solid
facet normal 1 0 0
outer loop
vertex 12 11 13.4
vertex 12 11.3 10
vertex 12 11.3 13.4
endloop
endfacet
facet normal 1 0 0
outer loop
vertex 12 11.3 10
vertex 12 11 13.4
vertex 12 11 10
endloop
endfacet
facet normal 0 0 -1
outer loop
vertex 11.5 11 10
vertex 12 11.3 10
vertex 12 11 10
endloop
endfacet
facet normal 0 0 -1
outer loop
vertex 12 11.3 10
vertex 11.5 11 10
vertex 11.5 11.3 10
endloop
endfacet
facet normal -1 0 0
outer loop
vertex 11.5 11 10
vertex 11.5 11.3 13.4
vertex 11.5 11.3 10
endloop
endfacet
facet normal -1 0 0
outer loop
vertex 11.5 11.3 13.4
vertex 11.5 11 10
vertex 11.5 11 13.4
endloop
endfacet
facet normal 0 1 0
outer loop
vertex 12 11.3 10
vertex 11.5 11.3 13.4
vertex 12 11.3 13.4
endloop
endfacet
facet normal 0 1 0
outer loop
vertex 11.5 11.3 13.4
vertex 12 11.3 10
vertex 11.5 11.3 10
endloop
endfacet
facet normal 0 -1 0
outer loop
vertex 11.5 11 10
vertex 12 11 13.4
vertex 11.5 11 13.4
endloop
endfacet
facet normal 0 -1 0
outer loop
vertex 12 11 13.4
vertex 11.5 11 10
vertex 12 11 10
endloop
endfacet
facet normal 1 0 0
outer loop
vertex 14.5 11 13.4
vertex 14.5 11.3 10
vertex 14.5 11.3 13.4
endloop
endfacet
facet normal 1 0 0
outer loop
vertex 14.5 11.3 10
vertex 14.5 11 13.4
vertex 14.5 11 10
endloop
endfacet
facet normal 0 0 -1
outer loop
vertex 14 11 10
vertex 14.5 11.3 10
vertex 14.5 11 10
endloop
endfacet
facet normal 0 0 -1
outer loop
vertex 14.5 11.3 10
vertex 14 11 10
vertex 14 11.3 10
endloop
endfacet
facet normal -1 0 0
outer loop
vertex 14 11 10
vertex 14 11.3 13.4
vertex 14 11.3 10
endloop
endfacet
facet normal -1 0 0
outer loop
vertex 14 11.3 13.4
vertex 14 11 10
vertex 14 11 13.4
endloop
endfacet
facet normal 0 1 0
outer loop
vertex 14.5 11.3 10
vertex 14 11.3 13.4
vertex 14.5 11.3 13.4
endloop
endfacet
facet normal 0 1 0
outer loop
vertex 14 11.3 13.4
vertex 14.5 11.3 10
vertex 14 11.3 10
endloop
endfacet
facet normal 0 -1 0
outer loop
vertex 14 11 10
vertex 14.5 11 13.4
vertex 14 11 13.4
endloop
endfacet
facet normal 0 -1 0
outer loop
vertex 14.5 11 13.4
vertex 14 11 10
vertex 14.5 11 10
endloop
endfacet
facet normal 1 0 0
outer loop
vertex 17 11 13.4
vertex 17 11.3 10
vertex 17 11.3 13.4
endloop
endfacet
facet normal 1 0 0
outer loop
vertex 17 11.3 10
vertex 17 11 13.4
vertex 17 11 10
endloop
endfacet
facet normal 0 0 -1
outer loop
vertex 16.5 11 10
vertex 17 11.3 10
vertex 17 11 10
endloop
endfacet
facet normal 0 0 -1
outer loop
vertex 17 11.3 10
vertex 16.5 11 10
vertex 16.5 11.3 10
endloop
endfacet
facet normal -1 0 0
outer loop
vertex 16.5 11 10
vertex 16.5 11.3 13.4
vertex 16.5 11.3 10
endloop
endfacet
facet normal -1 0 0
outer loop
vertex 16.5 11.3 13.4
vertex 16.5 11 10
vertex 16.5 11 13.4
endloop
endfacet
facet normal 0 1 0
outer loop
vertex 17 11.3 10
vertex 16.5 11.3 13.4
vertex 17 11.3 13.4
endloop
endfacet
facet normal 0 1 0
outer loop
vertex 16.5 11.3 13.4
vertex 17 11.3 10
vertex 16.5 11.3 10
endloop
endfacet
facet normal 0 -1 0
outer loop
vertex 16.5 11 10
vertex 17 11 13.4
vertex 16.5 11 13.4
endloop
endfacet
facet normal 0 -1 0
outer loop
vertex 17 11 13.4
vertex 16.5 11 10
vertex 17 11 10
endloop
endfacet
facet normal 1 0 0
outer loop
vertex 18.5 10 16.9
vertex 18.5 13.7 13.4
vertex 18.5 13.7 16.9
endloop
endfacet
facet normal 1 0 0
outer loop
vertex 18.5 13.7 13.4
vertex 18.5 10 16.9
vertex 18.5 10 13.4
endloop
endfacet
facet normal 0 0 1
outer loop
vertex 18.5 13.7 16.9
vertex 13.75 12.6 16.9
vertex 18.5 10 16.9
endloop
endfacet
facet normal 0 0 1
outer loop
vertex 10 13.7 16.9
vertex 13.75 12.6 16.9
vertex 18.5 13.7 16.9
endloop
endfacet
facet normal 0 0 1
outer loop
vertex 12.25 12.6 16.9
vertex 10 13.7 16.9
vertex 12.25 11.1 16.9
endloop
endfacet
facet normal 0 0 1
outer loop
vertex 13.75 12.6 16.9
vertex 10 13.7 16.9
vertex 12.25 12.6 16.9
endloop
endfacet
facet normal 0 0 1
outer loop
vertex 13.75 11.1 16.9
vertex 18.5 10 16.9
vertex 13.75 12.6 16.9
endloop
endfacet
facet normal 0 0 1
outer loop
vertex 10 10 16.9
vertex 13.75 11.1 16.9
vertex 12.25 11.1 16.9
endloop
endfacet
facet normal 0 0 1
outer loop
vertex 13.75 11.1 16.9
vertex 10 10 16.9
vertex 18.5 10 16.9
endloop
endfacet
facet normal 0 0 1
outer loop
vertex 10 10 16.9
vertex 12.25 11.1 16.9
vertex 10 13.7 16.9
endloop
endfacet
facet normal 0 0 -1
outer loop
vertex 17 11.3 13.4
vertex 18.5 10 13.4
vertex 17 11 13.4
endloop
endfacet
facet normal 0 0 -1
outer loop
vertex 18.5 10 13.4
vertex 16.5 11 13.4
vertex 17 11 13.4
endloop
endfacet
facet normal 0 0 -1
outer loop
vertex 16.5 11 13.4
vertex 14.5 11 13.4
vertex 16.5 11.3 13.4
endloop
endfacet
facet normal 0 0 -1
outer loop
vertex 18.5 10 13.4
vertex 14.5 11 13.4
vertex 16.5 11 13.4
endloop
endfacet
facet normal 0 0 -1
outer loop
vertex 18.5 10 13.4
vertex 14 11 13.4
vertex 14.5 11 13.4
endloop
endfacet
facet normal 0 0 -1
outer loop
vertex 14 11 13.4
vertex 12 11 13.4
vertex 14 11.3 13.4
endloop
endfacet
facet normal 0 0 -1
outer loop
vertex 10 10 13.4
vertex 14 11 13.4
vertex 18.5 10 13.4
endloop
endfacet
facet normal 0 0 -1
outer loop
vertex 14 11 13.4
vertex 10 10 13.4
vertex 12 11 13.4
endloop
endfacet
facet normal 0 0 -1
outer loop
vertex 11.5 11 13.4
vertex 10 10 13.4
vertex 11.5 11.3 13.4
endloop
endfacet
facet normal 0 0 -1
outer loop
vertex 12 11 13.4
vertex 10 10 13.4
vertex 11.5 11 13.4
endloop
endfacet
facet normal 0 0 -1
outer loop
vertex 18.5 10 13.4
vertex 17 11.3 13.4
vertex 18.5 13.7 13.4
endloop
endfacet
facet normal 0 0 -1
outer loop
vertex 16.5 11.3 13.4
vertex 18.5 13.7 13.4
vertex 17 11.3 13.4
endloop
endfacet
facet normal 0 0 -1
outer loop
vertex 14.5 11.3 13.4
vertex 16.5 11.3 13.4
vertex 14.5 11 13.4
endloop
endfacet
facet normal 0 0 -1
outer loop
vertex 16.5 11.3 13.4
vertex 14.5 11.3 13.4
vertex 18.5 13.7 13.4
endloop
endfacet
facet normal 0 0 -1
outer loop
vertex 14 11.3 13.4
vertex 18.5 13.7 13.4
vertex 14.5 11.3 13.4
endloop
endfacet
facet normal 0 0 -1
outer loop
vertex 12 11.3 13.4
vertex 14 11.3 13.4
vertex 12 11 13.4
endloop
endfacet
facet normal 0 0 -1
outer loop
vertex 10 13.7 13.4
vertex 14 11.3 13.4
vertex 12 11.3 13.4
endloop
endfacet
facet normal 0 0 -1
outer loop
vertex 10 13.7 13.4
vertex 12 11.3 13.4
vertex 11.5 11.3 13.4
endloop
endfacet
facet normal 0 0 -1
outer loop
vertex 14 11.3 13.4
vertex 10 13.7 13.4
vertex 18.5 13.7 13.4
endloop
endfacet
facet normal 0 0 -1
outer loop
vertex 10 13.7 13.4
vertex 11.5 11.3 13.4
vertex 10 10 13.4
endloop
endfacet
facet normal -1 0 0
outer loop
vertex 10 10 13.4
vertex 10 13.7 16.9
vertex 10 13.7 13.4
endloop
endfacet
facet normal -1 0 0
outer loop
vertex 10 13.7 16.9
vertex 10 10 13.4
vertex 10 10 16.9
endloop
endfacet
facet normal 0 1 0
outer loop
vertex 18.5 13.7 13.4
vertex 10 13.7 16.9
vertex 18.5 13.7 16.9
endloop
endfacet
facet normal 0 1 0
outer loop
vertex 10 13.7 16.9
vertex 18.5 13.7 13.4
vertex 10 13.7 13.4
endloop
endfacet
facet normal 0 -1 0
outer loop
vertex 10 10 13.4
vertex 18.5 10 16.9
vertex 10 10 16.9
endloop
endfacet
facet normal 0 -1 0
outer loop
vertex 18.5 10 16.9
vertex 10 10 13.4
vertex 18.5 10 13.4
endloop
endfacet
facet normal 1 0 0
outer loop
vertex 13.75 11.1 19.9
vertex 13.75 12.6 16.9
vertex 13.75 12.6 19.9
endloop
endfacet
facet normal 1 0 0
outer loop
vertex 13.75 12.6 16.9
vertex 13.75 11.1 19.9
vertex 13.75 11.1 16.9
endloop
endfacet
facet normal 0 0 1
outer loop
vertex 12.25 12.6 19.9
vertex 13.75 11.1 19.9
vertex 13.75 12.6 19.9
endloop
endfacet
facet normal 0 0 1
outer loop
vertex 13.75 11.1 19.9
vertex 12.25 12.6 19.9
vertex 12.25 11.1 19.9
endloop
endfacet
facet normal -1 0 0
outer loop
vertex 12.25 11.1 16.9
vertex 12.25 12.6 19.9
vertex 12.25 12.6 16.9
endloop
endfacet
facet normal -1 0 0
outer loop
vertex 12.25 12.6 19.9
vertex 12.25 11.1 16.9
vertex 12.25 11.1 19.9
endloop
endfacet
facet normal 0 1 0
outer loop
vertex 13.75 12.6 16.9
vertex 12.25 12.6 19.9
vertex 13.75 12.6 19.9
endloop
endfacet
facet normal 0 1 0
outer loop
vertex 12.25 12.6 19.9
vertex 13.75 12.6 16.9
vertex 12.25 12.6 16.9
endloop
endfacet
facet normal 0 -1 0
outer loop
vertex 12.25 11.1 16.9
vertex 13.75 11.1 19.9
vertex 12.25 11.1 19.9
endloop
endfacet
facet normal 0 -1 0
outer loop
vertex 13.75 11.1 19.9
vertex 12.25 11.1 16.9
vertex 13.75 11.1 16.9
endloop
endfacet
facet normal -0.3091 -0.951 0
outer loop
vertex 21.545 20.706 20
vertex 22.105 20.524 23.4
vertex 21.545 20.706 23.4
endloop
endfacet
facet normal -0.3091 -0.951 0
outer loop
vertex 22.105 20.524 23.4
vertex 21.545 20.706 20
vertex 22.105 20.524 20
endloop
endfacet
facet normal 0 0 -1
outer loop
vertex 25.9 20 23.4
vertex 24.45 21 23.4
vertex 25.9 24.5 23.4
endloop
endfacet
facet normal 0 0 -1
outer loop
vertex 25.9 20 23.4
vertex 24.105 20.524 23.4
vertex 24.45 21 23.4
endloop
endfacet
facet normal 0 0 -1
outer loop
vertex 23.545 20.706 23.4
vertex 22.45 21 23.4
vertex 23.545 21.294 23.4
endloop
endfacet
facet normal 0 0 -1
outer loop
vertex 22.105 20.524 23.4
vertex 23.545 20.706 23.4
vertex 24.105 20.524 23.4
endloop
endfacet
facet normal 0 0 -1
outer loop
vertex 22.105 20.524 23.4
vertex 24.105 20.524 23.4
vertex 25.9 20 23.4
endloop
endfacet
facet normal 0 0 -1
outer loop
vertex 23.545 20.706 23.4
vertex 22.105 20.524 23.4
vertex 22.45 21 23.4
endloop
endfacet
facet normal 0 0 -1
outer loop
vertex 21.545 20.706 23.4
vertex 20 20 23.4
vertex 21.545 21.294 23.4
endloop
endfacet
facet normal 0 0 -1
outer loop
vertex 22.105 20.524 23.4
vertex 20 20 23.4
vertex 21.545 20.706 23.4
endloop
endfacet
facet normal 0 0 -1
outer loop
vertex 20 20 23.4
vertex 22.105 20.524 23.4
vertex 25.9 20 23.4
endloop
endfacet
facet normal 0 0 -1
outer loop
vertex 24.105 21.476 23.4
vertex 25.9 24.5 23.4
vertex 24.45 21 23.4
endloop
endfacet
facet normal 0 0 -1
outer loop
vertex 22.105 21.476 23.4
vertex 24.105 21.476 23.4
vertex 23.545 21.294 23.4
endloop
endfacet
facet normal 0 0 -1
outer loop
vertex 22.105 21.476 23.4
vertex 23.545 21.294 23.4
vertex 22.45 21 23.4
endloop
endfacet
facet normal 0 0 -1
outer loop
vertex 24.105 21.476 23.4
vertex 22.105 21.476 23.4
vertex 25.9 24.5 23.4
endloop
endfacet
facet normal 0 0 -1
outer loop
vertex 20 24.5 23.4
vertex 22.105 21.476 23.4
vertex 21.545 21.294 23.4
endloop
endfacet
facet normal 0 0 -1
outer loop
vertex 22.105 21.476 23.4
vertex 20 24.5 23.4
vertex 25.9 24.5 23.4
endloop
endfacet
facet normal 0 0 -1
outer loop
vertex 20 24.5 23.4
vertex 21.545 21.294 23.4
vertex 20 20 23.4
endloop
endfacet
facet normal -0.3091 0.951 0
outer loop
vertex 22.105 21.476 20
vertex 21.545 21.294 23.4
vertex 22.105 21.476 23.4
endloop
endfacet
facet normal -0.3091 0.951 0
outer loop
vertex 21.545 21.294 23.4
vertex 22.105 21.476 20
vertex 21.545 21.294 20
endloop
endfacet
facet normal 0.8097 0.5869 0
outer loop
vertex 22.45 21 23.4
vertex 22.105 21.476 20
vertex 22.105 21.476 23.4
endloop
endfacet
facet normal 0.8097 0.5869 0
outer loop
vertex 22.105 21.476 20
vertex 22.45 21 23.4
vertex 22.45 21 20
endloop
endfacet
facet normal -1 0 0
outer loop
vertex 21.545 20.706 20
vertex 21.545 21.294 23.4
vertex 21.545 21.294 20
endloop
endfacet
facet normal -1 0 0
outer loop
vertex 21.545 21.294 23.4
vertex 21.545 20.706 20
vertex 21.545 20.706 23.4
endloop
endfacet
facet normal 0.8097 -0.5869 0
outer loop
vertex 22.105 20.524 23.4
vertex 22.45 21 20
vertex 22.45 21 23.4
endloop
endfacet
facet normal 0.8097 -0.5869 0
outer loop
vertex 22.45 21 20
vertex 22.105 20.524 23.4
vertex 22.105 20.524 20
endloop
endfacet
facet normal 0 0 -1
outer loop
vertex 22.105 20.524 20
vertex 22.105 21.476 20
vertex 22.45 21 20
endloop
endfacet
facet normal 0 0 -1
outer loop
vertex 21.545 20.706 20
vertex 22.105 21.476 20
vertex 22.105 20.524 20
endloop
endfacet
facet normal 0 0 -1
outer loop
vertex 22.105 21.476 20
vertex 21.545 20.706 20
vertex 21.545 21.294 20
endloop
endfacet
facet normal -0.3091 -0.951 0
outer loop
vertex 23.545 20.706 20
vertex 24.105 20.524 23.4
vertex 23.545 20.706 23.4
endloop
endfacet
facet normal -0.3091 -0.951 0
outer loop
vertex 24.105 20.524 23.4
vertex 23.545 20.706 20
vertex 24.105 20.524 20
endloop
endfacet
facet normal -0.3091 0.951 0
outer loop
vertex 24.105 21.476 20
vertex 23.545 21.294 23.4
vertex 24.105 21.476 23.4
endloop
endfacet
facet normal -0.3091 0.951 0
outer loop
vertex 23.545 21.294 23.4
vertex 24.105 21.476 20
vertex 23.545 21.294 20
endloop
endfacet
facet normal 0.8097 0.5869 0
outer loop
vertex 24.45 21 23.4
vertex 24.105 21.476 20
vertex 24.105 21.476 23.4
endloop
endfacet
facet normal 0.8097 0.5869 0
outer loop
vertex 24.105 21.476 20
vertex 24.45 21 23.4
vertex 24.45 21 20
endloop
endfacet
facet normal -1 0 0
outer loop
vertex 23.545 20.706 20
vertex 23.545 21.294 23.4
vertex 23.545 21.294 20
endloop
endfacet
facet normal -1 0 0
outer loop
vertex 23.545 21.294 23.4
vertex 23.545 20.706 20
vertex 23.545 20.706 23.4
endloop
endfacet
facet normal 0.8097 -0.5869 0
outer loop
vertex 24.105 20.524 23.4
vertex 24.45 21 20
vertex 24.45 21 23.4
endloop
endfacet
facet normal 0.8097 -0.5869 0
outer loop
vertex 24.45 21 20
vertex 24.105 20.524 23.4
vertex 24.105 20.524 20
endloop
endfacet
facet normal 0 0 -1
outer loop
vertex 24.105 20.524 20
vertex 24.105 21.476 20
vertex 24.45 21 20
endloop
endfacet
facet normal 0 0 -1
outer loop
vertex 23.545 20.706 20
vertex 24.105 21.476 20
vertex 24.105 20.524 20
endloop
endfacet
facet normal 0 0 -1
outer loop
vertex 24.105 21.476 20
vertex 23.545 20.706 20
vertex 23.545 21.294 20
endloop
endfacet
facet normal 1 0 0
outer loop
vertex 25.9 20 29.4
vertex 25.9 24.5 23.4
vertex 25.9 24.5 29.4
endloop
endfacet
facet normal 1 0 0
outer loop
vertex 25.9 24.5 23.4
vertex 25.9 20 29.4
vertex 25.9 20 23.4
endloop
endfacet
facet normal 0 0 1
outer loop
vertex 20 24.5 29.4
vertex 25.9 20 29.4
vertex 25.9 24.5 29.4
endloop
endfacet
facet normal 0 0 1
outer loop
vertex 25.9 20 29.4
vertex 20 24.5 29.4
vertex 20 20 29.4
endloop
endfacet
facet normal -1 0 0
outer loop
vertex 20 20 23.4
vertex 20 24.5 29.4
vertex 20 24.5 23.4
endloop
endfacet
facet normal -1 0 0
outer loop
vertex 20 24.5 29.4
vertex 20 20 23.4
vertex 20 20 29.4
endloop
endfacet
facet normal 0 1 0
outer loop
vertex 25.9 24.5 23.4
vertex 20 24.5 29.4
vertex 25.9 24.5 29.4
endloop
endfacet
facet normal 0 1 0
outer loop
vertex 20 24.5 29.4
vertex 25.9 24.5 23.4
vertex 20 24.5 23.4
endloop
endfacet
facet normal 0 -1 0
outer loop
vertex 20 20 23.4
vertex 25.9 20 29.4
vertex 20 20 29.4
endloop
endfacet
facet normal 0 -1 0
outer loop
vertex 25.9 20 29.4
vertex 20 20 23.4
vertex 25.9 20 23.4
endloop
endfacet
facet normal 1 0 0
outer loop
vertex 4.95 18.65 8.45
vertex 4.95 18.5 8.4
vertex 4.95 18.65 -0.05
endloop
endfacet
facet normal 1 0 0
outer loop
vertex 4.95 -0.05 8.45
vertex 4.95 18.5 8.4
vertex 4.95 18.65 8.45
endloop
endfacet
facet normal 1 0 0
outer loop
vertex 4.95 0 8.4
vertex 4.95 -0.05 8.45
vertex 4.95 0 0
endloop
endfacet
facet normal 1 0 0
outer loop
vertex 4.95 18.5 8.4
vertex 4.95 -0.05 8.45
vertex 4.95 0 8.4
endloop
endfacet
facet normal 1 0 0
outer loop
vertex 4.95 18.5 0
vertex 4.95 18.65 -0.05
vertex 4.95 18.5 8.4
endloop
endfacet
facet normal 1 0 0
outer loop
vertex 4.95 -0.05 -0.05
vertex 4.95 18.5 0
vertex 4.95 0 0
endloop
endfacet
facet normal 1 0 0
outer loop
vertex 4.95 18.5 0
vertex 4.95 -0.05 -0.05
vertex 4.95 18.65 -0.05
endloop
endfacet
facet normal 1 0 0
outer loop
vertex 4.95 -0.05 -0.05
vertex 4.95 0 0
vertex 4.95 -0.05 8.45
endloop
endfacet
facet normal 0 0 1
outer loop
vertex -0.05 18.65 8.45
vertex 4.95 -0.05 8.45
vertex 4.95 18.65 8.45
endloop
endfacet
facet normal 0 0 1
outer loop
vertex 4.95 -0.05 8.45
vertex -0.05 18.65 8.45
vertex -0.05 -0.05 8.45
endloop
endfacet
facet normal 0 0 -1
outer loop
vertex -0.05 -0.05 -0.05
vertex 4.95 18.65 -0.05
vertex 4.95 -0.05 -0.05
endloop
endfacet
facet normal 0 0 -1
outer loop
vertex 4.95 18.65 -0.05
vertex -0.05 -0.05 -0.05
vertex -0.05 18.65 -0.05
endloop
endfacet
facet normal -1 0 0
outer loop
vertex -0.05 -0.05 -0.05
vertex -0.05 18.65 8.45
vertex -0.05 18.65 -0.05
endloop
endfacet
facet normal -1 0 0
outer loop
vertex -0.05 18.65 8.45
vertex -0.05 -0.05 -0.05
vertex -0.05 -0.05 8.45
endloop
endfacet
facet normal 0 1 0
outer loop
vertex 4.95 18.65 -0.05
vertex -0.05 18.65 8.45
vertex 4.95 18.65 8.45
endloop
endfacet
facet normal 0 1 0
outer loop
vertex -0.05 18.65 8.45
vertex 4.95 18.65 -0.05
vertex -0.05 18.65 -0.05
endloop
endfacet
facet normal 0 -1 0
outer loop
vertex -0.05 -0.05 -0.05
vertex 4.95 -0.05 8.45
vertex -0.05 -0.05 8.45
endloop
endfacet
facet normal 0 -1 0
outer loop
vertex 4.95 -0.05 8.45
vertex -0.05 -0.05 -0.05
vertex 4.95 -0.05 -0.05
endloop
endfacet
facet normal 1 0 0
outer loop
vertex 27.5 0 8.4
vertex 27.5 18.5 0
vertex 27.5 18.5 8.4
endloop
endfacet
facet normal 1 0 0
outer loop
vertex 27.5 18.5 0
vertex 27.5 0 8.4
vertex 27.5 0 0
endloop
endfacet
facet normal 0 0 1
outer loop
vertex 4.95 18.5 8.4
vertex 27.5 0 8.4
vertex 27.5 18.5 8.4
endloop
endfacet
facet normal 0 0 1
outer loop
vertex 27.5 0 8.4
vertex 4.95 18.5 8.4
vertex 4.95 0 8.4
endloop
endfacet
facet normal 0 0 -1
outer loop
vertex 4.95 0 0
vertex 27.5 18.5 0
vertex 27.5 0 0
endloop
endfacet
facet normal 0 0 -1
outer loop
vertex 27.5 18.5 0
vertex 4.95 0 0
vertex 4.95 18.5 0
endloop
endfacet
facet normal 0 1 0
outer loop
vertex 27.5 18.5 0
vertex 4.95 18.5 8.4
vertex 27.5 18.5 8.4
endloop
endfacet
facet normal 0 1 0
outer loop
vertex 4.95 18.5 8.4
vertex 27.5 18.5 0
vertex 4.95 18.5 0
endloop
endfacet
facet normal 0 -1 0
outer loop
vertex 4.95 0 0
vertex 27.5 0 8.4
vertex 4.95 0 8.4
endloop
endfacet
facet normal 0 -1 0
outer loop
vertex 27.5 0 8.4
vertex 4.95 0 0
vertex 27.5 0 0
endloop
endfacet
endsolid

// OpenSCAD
module battery(){
  translate([-0.05,-0.05,-0.05])cube([5,18.7,8.5]);
  color("silver")cube([27.5,18.5,8.4]);
  translate([5,(18.5/2)-2.5,8]) text("battery",size=5);
}

module ph2housing(){
  translate([0,0,3.4]) cube([5.9, 4.5, 6]);
    for(length=[1.95: 2:5.9]){
         translate([length,1,0]) cylinder(h=3.4,r=0.5);
    }
}

module sw1(){
  translate([0,0,3.4]) cube([8.5, 3.7, 3.5]);
  translate([(8.5/2-2),(3.7/2)-(1.5/2),3.4]) cube([1.5, 1.5, 3+3.5]);
    for(length=[1.75-0.25:2.5:8.5]){
         translate([length,1,0]) cube([0.5,0.3,3.9]);
    }

}

translate([10,10,10])sw1();
translate([20,20,20]) ph2housing();
battery();
